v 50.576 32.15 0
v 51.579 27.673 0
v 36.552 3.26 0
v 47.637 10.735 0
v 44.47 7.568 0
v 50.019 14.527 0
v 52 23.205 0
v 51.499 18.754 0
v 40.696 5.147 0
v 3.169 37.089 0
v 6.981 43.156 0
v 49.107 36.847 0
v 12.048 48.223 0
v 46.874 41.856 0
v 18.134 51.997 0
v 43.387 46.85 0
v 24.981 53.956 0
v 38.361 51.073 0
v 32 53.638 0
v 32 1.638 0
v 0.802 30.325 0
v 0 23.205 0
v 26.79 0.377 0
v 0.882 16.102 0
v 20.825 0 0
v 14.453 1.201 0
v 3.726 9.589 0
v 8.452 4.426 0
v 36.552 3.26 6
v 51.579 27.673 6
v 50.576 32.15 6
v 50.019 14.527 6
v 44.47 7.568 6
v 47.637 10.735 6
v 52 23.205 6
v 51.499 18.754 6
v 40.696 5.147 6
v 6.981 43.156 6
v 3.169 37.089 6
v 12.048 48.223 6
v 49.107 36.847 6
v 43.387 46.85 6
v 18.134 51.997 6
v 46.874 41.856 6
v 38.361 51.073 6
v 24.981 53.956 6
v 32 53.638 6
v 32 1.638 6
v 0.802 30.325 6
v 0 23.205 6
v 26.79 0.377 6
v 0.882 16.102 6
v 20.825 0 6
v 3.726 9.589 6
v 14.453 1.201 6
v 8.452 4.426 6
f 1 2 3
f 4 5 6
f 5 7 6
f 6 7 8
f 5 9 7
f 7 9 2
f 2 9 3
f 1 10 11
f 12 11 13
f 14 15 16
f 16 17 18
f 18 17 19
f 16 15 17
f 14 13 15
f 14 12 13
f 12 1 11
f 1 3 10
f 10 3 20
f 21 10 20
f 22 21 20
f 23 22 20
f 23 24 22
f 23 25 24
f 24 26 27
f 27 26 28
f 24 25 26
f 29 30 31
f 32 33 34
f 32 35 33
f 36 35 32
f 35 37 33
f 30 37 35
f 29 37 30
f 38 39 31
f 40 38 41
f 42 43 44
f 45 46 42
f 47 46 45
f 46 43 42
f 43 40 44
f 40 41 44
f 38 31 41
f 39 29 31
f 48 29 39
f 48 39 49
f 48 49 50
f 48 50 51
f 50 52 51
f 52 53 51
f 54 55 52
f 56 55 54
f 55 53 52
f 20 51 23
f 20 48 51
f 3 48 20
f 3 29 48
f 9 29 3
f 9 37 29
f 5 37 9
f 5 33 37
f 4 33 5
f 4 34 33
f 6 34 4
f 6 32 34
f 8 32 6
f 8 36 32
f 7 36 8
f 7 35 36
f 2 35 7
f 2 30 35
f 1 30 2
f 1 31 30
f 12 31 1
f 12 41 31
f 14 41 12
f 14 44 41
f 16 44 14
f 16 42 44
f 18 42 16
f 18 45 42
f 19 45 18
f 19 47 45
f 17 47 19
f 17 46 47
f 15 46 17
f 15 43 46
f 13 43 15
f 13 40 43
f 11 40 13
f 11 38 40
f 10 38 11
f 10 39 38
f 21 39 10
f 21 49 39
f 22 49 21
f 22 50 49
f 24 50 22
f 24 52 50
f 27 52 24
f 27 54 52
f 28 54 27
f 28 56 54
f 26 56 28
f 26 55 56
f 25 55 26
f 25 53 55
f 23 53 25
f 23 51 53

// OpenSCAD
$fn = 32;

// ----------------------------------------------------------------------
// Cam disc: base radius 20.0 mm, lift 12.0 mm, 28 profile points
// ----------------------------------------------------------------------

// --- parameters (mm) ---
profile_height = 6;       // extrusion height
profile_points = 28;      // points of the closed outline

profile = [[52, 23.205], [51.579, 27.673], [50.576, 32.15], [49.107, 36.847], [46.874, 41.856], [43.387, 46.85], [38.361, 51.073], [32, 53.638], [24.981, 53.956], [18.134, 51.997], [12.048, 48.223], [6.981, 43.156], [3.169, 37.089], [0.802, 30.325], [0, 23.205], [0.882, 16.102], [3.726, 9.589], [8.452, 4.426], [14.453, 1.201], [20.825, 0], [26.79, 0.377], [32, 1.638], [36.552, 3.26], [40.696, 5.147], [44.47, 7.568], [47.637, 10.735], [50.019, 14.527], [51.499, 18.754]];  // single closed polygon, 28 points, counter clockwise

// --- the one profile operation ---
linear_extrude(height = profile_height) polygon(points = profile);
